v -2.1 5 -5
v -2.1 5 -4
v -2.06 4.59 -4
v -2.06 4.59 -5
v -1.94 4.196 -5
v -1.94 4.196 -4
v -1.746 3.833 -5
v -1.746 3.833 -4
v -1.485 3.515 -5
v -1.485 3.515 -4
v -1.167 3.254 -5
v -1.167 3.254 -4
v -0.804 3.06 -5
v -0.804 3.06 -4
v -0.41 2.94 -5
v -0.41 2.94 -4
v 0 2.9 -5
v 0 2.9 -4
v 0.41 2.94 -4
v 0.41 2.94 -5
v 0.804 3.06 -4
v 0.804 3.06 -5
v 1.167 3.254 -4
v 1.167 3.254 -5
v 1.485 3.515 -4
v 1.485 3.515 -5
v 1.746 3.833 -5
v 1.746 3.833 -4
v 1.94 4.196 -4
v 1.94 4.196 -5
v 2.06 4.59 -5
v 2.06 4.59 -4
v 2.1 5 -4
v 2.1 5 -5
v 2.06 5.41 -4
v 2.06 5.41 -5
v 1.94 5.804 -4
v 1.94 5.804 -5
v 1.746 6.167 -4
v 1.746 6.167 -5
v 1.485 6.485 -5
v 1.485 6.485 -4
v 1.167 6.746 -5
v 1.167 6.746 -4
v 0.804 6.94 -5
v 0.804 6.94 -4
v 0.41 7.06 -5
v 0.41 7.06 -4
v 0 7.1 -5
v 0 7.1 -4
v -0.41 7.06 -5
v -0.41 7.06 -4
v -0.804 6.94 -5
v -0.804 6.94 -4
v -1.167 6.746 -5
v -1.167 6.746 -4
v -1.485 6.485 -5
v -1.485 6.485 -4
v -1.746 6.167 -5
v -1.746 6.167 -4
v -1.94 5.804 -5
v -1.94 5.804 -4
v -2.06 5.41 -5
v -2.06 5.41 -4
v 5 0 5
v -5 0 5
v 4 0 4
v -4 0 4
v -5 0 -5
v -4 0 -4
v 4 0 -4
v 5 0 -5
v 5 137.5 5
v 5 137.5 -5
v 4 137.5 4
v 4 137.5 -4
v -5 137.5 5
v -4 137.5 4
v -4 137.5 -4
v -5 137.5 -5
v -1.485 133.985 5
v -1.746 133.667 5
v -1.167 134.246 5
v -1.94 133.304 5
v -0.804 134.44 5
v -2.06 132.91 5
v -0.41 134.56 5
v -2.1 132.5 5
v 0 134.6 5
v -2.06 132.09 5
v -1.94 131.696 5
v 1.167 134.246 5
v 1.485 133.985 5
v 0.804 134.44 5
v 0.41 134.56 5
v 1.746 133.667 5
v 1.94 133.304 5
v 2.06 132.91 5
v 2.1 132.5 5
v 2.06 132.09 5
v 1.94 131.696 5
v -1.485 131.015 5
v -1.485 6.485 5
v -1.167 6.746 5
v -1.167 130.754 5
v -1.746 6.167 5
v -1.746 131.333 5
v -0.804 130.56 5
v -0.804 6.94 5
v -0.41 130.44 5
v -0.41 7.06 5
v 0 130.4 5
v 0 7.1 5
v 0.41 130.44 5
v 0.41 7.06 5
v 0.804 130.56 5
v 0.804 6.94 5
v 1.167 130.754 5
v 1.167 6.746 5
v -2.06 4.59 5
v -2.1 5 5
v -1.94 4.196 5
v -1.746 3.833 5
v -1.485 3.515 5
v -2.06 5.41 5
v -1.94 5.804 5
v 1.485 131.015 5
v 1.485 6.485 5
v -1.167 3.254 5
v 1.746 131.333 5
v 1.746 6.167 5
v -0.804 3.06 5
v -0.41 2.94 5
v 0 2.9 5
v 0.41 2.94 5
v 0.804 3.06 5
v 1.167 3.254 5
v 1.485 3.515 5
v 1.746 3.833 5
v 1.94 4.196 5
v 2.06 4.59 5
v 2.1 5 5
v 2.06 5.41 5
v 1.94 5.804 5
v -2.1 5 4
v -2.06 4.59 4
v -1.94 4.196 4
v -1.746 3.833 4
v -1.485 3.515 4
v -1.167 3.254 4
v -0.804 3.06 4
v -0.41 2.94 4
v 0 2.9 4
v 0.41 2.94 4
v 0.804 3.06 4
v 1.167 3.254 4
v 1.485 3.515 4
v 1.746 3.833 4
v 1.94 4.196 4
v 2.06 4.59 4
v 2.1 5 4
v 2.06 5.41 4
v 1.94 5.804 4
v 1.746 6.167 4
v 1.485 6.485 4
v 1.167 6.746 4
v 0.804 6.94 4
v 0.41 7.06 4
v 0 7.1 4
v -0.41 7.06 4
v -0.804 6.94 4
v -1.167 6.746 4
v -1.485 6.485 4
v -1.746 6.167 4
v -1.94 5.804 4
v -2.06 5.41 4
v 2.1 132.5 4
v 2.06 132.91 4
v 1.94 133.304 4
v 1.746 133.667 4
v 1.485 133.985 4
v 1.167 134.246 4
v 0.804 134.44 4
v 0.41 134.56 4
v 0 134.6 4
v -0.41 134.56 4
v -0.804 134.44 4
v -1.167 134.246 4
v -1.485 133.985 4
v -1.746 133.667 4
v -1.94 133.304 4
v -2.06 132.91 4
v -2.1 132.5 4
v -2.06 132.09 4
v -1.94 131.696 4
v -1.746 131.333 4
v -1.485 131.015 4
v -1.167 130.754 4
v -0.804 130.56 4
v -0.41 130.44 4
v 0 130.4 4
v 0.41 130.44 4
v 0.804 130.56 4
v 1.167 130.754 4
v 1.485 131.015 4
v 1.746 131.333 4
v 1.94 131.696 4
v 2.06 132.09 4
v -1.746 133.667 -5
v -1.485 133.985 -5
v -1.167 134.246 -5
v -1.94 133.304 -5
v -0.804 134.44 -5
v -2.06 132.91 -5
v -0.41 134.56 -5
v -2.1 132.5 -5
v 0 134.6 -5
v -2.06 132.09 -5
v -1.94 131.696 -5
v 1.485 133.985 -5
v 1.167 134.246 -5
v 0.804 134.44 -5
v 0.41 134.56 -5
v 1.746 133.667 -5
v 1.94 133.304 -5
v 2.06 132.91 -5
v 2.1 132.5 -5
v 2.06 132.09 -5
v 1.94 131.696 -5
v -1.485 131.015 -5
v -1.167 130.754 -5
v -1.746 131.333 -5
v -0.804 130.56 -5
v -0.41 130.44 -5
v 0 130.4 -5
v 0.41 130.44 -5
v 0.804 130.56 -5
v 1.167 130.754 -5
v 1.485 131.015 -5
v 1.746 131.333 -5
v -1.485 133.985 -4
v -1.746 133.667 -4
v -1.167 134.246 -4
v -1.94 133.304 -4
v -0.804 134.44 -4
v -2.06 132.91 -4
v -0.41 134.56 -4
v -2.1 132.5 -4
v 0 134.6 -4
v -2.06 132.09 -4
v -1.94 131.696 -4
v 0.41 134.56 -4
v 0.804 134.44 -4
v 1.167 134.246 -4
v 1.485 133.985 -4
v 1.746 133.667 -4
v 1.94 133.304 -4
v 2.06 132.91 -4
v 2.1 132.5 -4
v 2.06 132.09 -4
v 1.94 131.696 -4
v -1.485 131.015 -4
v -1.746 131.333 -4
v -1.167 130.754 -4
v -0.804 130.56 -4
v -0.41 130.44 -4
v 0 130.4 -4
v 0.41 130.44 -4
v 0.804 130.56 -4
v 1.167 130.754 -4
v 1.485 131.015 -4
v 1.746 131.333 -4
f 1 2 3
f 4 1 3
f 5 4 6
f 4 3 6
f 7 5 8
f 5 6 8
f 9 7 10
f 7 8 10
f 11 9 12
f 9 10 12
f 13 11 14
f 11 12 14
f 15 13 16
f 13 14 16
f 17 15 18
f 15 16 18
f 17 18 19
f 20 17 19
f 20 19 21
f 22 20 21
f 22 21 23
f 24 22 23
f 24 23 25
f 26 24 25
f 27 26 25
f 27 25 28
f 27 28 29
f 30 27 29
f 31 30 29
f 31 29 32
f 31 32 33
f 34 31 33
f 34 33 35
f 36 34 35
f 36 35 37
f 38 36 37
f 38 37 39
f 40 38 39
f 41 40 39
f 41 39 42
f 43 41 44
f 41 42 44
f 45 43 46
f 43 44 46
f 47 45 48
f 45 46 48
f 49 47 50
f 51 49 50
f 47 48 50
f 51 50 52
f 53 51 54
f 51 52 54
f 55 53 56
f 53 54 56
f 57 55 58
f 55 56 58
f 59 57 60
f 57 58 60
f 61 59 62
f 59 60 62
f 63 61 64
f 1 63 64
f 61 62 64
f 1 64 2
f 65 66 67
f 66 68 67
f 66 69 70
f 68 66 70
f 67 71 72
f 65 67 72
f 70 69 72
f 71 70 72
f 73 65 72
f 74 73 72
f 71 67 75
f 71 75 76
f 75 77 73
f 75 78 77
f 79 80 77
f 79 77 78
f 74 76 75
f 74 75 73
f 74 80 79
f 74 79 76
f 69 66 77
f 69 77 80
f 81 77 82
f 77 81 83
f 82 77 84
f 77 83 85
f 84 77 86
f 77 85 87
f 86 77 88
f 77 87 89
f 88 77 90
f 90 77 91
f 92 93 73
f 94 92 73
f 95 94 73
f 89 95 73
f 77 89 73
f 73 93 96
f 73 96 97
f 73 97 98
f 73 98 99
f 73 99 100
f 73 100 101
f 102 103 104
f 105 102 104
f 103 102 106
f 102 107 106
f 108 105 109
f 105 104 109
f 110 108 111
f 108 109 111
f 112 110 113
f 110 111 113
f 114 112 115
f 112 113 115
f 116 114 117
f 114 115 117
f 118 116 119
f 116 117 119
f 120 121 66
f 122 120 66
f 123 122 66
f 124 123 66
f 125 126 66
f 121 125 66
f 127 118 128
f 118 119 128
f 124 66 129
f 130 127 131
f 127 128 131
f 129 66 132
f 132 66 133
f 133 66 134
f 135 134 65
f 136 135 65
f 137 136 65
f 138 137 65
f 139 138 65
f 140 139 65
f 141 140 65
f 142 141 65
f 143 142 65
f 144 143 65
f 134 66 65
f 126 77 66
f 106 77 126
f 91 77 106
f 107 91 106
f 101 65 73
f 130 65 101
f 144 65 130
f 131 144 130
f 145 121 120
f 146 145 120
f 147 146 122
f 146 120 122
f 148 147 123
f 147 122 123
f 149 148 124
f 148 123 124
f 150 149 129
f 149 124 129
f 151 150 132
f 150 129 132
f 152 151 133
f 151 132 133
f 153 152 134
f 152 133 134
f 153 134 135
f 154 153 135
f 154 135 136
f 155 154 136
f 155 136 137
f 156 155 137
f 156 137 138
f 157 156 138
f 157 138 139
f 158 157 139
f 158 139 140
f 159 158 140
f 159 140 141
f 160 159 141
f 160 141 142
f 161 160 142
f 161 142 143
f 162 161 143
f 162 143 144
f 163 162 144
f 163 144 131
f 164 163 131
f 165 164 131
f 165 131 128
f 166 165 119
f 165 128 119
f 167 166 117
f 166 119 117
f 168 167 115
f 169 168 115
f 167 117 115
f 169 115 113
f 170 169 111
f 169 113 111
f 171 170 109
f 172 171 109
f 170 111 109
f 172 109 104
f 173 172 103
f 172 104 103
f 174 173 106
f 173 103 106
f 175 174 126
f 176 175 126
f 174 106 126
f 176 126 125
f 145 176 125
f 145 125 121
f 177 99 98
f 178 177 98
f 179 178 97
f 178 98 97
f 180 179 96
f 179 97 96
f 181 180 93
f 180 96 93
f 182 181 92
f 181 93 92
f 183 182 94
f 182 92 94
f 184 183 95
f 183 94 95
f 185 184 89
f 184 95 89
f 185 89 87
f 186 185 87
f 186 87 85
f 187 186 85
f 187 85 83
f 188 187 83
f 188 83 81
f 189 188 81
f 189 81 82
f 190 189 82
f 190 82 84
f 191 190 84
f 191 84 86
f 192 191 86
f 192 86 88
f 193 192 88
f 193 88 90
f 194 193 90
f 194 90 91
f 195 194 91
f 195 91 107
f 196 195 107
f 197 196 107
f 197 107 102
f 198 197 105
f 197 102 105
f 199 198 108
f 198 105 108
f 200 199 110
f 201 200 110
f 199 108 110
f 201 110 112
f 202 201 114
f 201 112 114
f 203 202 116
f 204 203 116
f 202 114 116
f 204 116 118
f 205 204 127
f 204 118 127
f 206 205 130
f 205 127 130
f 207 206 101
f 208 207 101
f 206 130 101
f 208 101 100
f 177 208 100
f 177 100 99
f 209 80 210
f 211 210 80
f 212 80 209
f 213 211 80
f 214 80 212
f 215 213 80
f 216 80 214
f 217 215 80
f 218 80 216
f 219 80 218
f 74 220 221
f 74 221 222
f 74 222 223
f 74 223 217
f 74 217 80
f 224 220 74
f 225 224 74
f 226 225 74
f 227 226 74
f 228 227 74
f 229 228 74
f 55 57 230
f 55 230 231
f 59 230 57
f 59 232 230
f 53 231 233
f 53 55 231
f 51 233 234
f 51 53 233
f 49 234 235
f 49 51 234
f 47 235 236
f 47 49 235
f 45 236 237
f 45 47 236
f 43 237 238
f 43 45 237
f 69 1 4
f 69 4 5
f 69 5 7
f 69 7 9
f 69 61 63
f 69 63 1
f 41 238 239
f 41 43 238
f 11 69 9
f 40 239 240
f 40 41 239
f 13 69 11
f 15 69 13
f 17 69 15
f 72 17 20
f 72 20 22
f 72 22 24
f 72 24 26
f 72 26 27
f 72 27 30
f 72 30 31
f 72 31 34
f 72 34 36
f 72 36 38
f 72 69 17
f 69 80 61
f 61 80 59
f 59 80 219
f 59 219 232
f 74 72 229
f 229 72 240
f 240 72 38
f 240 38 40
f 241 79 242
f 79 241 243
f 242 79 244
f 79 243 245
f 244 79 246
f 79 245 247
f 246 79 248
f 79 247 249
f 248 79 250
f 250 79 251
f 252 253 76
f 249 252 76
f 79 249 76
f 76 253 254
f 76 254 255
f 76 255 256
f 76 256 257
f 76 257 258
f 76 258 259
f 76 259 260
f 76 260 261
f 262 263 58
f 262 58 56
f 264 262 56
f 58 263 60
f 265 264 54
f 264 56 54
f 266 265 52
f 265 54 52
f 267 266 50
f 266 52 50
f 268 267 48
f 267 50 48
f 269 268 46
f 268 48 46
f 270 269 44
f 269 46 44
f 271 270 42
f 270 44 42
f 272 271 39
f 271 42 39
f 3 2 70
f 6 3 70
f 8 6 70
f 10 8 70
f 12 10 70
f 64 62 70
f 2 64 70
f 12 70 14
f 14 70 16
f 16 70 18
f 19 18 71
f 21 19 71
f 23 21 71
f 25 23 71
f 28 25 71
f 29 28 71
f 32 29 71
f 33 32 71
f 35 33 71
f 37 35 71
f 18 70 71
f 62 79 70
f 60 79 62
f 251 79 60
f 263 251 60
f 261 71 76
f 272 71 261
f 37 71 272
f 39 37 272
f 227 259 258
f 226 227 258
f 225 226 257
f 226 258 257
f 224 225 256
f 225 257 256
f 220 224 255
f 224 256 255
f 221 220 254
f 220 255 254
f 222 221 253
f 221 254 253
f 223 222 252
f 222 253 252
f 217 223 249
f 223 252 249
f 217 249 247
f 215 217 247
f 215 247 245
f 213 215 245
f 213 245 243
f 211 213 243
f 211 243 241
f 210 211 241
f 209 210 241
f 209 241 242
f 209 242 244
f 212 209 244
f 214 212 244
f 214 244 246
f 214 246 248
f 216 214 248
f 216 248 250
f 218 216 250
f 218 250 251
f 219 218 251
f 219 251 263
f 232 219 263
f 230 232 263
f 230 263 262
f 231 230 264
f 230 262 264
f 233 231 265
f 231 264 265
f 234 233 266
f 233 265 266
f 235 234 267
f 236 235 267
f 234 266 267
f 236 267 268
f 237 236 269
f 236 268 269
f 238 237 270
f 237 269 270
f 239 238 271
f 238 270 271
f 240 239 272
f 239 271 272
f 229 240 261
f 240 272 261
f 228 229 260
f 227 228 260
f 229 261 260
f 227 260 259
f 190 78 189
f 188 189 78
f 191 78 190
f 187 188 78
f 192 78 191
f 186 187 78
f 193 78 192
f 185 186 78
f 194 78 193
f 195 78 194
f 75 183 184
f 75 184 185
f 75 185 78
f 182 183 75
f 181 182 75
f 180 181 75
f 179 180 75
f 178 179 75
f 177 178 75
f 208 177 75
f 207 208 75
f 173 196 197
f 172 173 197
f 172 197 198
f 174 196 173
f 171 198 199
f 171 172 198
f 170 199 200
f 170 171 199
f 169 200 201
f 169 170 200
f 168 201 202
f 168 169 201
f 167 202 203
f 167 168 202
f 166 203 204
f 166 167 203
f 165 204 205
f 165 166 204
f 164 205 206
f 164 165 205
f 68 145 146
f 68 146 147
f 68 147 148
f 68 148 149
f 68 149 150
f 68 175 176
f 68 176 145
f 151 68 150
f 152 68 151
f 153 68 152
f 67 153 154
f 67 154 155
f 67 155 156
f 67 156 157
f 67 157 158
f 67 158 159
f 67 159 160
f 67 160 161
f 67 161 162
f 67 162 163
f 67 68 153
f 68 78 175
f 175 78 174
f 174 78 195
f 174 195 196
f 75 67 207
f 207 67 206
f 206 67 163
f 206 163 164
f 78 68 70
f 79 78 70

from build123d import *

# Parameters (mm, degrees)
SKETCH_1_W          = 10
SKETCH_1_H          = 10
SKETCH_1_W_2        = 8
SKETCH_1_H_2        = 8
EXTRUDE_1_DEPTH     = 137.5
CUT_EXTRUDE_1_REACH = 139.954
SKETCH_2_R          = 2.1


with BuildPart() as part:
    # ｽｹｯﾁ1 → 押し出し-薄板1 (new body)
    with BuildSketch(Plane(origin=(0, 0, 0), x_dir=(1, 0, 0), z_dir=(0, 1, 0))):
        Rectangle(SKETCH_1_W, SKETCH_1_H)
        Rectangle(SKETCH_1_W_2, SKETCH_1_H_2, mode=Mode.SUBTRACT)
    extrude(amount=EXTRUDE_1_DEPTH)

    # ｶｯﾄ - 押し出し1: up to this face of the body (flat: up to its plane)
    cut_extrude_1_end = Plane(part.part.faces().sort_by_distance((0, 68.75, -5))[0])
    # ｽｹｯﾁ2 → ｶｯﾄ - 押し出し1 (cut, up to the picked face)
    with BuildSketch(Plane.XY.offset(5), mode=Mode.PRIVATE) as cut_extrude_1_sk1:
        with Locations((0, 132.5)):
            Circle(SKETCH_2_R)
    cut_extrude_1_tool1 = split(extrude(cut_extrude_1_sk1.sketch, amount=-CUT_EXTRUDE_1_REACH, mode=Mode.PRIVATE), bisect_by=cut_extrude_1_end, keep=Keep.BOTH, mode=Mode.PRIVATE)
    # ｽｹｯﾁ2 → ｶｯﾄ - 押し出し1 (cut, up to the picked face)
    with BuildSketch(Plane.XY.offset(5), mode=Mode.PRIVATE) as cut_extrude_1_sk2:
        with Locations(Location((0, 5, 0), (0, 0, 180))):
            Circle(SKETCH_2_R)
    cut_extrude_1_tool2 = split(extrude(cut_extrude_1_sk2.sketch, amount=-CUT_EXTRUDE_1_REACH, mode=Mode.PRIVATE), bisect_by=cut_extrude_1_end, keep=Keep.BOTH, mode=Mode.PRIVATE)
    add(cut_extrude_1_tool1.solids().sort_by(Axis((0, 132.5, 5), (0, 0, -1)))[0], mode=Mode.SUBTRACT)
    add(cut_extrude_1_tool2.solids().sort_by(Axis((0, 5, 5), (0, 0, -1)))[0], mode=Mode.SUBTRACT)


solid = part.part
